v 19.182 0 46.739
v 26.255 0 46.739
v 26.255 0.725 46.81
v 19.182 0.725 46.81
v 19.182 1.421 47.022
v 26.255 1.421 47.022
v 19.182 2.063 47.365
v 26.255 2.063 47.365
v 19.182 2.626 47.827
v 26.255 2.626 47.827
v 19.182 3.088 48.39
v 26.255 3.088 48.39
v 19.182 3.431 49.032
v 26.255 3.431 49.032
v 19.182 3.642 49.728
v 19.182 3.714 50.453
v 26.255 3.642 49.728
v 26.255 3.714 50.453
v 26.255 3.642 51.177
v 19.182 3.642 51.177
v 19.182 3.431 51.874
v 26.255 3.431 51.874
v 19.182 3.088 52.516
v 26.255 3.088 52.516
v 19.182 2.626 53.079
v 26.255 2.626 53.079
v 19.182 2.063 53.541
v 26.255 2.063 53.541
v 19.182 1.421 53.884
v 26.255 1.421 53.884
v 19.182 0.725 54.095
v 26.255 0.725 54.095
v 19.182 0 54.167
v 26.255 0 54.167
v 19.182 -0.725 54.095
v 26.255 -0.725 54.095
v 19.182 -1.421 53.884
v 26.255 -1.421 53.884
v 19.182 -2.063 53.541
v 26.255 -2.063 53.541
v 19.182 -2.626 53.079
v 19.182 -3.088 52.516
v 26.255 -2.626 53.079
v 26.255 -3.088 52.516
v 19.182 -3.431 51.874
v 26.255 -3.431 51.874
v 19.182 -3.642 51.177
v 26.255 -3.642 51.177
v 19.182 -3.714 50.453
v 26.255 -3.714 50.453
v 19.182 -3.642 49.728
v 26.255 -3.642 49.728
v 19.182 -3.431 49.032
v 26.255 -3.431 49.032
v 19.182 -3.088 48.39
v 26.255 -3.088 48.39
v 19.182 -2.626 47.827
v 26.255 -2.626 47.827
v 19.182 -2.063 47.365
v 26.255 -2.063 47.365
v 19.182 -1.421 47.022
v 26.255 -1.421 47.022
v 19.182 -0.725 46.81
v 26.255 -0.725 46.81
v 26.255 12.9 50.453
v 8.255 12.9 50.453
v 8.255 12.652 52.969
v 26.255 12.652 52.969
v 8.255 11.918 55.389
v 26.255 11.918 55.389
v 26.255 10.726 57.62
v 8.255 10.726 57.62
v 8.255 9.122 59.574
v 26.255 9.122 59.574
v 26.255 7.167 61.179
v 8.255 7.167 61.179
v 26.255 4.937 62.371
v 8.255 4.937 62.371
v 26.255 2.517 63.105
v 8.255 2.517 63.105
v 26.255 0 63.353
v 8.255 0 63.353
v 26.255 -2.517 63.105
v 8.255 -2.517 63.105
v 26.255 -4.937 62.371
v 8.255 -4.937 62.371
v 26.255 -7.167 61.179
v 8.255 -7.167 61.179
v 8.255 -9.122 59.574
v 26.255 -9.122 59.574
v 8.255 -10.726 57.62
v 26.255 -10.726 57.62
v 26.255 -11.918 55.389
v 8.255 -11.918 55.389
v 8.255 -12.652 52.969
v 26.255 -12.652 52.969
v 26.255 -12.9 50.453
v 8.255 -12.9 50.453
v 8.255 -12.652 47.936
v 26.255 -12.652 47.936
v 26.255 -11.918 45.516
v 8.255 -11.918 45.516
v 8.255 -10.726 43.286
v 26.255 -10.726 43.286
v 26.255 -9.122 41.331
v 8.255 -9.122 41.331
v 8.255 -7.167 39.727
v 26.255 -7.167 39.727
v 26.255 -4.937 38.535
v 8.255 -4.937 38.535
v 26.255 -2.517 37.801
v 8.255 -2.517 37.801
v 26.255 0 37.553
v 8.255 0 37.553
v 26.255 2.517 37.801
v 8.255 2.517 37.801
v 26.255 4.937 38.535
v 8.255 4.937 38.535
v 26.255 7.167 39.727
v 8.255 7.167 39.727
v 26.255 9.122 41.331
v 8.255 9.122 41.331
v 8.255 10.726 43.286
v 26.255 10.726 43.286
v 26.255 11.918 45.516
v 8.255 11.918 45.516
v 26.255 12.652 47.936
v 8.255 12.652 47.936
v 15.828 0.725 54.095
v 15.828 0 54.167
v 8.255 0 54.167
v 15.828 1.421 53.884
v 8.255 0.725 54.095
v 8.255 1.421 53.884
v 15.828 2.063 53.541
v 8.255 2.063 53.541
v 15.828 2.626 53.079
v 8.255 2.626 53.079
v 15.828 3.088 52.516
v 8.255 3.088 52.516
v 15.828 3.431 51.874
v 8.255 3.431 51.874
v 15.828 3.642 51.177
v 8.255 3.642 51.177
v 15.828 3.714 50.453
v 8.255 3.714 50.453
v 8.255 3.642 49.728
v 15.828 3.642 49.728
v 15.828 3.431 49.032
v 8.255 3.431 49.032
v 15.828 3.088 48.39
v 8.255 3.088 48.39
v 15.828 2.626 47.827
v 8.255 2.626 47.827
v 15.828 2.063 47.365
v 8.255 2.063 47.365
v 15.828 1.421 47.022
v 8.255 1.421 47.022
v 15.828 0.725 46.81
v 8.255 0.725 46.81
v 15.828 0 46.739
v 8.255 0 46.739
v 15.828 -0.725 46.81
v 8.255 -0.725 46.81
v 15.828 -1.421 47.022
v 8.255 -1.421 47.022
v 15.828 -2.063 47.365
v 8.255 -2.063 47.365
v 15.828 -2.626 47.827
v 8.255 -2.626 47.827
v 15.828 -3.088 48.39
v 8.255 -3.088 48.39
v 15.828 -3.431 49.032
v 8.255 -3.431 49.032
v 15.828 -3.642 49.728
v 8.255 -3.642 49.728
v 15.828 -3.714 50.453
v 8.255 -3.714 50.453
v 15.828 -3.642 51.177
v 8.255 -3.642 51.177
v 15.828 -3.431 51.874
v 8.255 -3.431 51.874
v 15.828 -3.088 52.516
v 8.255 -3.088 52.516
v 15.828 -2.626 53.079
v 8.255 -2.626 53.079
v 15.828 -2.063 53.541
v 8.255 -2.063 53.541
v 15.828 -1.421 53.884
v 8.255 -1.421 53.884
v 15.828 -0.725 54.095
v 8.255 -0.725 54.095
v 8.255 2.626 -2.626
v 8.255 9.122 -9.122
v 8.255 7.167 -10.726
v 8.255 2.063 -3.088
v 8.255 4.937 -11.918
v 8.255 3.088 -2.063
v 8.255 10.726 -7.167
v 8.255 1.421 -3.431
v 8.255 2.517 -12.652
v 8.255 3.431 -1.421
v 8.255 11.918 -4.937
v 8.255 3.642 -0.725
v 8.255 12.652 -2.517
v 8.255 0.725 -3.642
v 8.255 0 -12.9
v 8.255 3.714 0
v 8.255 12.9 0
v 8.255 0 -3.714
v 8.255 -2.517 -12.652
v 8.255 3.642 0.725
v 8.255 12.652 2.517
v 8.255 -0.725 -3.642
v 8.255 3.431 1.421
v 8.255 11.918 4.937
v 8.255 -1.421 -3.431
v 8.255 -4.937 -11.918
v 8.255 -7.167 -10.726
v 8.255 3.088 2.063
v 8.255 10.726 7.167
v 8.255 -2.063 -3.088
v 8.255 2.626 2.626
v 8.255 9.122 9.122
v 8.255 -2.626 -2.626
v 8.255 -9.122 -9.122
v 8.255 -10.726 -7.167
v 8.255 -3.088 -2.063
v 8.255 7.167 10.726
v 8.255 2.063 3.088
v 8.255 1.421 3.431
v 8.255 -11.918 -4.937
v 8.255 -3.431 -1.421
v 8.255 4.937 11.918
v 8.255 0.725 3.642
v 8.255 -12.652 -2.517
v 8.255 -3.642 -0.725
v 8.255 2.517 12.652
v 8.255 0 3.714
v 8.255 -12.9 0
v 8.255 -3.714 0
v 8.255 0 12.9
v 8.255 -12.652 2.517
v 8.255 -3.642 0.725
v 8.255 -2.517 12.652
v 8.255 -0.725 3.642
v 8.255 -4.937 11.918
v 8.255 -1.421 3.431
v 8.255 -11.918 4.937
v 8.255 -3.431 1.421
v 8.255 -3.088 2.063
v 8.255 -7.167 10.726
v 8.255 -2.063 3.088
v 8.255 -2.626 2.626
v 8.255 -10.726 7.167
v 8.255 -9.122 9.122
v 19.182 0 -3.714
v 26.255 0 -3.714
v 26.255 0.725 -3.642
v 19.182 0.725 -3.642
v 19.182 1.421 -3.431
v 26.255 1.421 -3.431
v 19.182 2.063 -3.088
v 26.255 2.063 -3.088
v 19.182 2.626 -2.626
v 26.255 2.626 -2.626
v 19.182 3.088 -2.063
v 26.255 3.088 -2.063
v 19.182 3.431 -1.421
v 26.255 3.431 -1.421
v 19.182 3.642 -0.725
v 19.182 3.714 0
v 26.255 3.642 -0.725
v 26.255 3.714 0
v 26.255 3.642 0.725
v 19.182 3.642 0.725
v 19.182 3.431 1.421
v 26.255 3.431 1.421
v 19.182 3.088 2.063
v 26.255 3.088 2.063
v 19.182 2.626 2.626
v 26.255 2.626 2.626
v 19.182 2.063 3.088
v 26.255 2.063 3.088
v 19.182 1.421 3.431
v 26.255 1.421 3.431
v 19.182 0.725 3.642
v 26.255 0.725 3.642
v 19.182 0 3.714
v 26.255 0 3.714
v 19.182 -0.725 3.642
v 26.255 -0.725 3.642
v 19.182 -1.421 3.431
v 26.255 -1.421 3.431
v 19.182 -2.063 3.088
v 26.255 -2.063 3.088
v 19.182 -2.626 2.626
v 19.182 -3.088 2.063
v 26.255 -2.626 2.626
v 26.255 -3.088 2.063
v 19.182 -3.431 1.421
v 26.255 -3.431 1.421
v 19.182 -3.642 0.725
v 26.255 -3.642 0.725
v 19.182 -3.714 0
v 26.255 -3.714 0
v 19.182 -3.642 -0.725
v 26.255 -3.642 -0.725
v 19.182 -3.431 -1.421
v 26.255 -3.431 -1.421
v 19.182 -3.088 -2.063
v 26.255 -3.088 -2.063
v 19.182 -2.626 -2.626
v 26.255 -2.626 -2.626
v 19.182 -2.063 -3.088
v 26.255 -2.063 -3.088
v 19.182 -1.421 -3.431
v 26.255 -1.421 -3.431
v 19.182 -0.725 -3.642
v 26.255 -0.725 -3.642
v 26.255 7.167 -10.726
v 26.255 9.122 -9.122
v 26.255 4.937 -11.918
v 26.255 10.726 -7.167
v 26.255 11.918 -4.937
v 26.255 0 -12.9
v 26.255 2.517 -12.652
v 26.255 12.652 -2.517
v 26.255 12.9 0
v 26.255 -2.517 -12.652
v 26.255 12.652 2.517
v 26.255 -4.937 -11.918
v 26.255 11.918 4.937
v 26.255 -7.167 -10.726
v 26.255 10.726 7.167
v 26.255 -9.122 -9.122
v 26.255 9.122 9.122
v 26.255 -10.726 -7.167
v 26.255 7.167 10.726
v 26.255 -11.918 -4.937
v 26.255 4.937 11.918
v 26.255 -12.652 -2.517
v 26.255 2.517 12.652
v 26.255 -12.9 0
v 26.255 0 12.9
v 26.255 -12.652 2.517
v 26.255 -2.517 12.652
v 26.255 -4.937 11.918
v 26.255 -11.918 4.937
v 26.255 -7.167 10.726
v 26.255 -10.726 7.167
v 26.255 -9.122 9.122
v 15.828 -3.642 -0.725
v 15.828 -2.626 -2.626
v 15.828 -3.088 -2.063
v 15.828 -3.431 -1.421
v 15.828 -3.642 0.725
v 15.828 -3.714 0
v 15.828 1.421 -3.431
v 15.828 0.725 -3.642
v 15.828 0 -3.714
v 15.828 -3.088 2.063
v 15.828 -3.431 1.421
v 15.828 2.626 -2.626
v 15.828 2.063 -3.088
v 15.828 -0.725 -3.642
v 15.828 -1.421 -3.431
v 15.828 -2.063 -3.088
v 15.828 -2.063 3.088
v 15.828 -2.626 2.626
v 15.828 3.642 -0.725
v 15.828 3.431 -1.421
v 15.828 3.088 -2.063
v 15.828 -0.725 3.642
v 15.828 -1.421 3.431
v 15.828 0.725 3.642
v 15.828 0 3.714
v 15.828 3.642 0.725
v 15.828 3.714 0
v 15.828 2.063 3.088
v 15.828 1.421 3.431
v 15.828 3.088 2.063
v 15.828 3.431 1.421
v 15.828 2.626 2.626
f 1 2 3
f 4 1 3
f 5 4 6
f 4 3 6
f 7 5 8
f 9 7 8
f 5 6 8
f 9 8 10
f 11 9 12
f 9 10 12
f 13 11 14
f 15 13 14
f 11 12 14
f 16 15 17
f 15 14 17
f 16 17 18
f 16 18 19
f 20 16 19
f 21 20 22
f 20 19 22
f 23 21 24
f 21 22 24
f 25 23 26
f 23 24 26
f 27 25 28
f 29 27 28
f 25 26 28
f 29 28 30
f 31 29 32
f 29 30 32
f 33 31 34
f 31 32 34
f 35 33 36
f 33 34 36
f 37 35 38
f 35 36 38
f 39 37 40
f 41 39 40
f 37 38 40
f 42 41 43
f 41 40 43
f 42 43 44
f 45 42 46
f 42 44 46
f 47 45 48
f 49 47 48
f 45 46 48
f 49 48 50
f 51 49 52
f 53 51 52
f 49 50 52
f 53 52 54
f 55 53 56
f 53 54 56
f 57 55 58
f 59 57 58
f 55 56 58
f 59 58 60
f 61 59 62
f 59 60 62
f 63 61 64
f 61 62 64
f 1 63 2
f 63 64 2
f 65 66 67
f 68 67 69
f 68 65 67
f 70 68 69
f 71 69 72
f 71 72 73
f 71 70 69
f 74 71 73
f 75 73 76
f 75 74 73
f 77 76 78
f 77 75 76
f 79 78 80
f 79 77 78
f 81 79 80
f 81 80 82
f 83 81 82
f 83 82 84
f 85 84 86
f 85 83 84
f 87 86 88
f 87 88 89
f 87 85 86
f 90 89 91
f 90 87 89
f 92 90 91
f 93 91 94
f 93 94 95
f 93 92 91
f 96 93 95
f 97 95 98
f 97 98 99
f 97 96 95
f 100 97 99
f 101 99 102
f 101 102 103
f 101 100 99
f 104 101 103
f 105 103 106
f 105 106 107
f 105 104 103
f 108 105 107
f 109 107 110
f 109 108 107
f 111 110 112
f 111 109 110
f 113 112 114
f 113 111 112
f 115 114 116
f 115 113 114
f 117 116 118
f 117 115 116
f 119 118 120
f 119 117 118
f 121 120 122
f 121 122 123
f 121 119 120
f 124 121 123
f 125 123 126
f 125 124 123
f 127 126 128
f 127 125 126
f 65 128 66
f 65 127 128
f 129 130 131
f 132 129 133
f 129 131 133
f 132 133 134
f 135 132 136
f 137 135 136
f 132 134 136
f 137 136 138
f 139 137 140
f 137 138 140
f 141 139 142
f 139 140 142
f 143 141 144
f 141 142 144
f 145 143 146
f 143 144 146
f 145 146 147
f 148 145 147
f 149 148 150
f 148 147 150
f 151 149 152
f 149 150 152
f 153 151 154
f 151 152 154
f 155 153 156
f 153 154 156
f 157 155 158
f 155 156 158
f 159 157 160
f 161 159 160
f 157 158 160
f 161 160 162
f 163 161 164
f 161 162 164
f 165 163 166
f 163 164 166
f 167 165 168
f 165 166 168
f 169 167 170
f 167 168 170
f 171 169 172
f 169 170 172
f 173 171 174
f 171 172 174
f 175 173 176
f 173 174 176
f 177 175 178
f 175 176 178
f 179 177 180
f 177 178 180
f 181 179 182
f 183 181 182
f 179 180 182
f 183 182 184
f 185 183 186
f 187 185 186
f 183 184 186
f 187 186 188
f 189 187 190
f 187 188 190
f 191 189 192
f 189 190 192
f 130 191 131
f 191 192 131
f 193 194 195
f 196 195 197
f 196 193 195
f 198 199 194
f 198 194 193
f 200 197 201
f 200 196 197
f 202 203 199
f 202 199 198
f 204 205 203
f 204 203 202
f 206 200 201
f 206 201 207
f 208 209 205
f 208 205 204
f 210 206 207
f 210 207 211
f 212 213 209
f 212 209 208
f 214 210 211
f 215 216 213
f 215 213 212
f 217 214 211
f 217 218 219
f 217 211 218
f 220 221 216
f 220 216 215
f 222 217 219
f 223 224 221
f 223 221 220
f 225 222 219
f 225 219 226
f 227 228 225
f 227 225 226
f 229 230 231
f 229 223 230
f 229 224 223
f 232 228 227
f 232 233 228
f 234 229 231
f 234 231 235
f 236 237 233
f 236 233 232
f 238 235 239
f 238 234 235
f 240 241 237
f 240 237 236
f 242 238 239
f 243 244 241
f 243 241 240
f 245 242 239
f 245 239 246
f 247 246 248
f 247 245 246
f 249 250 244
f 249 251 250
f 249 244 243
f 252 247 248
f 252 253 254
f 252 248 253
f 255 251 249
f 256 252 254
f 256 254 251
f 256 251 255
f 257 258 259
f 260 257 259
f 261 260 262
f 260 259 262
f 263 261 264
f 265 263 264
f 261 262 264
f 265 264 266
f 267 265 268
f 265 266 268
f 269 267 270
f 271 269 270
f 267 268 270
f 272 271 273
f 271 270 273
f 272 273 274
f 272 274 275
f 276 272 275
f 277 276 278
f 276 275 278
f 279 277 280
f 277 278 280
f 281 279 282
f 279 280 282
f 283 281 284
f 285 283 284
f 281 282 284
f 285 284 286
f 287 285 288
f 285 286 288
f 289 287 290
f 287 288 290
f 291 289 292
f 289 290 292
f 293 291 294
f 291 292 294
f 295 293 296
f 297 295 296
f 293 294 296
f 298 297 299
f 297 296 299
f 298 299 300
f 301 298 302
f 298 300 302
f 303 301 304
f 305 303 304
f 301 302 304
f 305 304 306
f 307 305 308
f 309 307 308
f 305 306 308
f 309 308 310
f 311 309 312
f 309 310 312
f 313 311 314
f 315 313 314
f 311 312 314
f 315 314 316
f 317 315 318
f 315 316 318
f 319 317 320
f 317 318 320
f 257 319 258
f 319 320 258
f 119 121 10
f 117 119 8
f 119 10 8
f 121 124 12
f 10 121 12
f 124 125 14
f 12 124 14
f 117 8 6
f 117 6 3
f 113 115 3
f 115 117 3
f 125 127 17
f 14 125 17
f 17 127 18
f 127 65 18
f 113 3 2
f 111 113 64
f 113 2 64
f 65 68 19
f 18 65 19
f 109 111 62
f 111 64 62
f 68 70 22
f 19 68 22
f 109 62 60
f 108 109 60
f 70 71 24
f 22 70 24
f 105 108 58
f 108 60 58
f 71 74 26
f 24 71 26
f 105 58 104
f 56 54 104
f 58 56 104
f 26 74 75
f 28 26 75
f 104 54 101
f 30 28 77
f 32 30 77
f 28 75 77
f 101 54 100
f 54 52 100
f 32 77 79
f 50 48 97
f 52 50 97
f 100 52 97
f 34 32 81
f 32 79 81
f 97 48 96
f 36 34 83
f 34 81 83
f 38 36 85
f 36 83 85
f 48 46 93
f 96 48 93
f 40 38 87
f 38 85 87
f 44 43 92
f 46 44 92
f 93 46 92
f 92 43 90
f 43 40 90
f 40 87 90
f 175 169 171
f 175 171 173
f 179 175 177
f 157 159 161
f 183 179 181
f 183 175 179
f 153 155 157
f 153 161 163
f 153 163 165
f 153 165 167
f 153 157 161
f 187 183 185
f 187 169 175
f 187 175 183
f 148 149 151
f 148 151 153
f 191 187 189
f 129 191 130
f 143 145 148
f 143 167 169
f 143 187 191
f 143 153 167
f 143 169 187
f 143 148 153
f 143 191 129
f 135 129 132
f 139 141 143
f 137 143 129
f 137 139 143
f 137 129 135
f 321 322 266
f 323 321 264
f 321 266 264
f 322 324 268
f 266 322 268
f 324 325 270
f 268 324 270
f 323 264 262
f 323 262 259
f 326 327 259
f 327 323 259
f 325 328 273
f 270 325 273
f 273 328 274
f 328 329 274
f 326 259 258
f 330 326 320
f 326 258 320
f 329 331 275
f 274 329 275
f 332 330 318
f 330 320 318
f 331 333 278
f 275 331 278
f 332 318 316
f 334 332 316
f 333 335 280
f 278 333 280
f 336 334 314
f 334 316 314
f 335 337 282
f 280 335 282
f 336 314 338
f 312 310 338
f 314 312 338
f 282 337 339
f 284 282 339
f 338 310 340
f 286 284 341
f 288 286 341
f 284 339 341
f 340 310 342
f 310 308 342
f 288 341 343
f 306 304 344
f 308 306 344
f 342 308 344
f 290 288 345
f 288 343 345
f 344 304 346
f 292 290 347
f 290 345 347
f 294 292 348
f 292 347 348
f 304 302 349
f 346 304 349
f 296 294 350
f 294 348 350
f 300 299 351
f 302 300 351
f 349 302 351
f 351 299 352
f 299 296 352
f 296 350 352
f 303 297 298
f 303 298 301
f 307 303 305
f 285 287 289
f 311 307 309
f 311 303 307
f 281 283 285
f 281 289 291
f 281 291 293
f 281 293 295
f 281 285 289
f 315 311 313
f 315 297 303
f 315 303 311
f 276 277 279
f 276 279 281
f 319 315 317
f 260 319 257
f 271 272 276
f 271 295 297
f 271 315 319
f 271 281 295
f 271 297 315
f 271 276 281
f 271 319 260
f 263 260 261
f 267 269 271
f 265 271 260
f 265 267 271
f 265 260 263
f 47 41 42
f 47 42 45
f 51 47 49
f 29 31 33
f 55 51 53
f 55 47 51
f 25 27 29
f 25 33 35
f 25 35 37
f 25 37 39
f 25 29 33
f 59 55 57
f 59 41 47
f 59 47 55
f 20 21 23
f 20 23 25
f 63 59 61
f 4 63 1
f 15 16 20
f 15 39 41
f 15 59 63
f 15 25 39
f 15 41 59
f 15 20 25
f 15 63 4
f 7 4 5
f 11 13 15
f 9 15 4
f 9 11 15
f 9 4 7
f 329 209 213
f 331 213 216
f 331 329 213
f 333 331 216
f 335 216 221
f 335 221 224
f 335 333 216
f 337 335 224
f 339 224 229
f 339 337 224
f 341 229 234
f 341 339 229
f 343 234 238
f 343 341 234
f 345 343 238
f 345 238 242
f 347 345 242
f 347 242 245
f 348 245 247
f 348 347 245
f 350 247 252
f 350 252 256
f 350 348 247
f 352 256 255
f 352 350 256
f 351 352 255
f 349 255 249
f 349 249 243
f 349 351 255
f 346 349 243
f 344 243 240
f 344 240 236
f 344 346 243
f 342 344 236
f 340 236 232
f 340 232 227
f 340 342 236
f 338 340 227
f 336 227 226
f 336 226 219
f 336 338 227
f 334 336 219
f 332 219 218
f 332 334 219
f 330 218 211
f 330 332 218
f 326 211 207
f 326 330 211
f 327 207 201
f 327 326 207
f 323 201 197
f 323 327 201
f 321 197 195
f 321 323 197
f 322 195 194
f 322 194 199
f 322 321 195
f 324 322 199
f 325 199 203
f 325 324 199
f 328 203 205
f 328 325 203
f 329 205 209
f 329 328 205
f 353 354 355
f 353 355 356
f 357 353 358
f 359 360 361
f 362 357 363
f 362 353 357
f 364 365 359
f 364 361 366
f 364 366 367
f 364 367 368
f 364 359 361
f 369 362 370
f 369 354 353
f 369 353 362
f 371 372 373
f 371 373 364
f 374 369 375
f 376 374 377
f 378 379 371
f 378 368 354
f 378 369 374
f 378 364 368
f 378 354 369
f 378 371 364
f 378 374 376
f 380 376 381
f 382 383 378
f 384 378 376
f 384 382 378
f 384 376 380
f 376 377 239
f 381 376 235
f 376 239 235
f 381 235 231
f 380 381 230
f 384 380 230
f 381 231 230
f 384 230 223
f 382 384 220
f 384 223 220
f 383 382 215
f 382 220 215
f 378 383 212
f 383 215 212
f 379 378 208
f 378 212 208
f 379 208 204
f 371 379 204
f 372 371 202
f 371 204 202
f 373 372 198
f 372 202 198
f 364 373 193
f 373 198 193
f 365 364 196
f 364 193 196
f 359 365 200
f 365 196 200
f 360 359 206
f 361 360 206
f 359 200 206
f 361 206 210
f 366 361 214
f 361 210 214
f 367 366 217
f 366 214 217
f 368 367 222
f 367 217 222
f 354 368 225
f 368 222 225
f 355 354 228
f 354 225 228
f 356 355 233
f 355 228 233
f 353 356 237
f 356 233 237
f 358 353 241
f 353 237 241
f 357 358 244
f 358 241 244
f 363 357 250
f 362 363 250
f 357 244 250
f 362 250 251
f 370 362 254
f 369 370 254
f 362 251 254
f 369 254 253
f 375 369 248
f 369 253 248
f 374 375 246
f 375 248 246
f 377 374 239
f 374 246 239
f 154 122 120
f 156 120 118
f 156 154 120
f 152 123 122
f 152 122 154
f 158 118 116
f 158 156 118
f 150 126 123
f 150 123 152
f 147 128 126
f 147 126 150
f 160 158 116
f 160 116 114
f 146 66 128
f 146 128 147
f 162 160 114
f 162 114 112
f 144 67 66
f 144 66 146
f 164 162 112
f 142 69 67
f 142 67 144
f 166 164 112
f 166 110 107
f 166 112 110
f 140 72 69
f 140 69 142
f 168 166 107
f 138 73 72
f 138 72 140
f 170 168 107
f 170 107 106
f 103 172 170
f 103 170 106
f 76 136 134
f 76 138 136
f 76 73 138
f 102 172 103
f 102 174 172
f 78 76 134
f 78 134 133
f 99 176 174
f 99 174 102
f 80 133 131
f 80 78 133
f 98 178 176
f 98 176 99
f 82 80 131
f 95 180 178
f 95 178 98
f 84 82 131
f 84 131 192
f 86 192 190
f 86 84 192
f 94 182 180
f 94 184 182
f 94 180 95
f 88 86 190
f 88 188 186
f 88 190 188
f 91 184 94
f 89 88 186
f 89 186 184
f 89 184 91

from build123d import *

# Parameters (mm, degrees)
SKETCH1_W          = 18
SKETCH1_H          = 12.9
SKETCH2_R          = 3.71375
CUT_EXTRUDE1_DEPTH = 7.5725
SKETCH4_R          = 3.71375
CUT_EXTRUDE2_DEPTH = 7.0725


with BuildPart() as part:
    # Sketch1 → Revolve1 (revolve)
    with BuildSketch(Plane.XY):
        with Locations((17.255, 6.45)):
            Rectangle(SKETCH1_W, SKETCH1_H)
    revolve(axis=Axis((8.255, 0, 0), (1, 0, 0)))

    # Sketch2 → Cut-Extrude1 (cut)
    with BuildSketch(Plane.ZY.offset(-8.255)):
        Circle(SKETCH2_R)
    extrude(amount=-CUT_EXTRUDE1_DEPTH, mode=Mode.SUBTRACT)

    # Sketch4 → Cut-Extrude2 (cut)
    with BuildSketch(Plane(origin=(26.255, 0, 0), x_dir=(0, 0, -1), z_dir=(1, 0, 0))):
        Circle(SKETCH4_R)
    extrude(amount=-CUT_EXTRUDE2_DEPTH, mode=Mode.SUBTRACT)


with BuildPart() as body_2:
    # Body-Move/Copy1: copy of part
    add(part.part.moved(Location((0, 0, 50.452769062))))


solid = Compound([part.part, body_2.part])
